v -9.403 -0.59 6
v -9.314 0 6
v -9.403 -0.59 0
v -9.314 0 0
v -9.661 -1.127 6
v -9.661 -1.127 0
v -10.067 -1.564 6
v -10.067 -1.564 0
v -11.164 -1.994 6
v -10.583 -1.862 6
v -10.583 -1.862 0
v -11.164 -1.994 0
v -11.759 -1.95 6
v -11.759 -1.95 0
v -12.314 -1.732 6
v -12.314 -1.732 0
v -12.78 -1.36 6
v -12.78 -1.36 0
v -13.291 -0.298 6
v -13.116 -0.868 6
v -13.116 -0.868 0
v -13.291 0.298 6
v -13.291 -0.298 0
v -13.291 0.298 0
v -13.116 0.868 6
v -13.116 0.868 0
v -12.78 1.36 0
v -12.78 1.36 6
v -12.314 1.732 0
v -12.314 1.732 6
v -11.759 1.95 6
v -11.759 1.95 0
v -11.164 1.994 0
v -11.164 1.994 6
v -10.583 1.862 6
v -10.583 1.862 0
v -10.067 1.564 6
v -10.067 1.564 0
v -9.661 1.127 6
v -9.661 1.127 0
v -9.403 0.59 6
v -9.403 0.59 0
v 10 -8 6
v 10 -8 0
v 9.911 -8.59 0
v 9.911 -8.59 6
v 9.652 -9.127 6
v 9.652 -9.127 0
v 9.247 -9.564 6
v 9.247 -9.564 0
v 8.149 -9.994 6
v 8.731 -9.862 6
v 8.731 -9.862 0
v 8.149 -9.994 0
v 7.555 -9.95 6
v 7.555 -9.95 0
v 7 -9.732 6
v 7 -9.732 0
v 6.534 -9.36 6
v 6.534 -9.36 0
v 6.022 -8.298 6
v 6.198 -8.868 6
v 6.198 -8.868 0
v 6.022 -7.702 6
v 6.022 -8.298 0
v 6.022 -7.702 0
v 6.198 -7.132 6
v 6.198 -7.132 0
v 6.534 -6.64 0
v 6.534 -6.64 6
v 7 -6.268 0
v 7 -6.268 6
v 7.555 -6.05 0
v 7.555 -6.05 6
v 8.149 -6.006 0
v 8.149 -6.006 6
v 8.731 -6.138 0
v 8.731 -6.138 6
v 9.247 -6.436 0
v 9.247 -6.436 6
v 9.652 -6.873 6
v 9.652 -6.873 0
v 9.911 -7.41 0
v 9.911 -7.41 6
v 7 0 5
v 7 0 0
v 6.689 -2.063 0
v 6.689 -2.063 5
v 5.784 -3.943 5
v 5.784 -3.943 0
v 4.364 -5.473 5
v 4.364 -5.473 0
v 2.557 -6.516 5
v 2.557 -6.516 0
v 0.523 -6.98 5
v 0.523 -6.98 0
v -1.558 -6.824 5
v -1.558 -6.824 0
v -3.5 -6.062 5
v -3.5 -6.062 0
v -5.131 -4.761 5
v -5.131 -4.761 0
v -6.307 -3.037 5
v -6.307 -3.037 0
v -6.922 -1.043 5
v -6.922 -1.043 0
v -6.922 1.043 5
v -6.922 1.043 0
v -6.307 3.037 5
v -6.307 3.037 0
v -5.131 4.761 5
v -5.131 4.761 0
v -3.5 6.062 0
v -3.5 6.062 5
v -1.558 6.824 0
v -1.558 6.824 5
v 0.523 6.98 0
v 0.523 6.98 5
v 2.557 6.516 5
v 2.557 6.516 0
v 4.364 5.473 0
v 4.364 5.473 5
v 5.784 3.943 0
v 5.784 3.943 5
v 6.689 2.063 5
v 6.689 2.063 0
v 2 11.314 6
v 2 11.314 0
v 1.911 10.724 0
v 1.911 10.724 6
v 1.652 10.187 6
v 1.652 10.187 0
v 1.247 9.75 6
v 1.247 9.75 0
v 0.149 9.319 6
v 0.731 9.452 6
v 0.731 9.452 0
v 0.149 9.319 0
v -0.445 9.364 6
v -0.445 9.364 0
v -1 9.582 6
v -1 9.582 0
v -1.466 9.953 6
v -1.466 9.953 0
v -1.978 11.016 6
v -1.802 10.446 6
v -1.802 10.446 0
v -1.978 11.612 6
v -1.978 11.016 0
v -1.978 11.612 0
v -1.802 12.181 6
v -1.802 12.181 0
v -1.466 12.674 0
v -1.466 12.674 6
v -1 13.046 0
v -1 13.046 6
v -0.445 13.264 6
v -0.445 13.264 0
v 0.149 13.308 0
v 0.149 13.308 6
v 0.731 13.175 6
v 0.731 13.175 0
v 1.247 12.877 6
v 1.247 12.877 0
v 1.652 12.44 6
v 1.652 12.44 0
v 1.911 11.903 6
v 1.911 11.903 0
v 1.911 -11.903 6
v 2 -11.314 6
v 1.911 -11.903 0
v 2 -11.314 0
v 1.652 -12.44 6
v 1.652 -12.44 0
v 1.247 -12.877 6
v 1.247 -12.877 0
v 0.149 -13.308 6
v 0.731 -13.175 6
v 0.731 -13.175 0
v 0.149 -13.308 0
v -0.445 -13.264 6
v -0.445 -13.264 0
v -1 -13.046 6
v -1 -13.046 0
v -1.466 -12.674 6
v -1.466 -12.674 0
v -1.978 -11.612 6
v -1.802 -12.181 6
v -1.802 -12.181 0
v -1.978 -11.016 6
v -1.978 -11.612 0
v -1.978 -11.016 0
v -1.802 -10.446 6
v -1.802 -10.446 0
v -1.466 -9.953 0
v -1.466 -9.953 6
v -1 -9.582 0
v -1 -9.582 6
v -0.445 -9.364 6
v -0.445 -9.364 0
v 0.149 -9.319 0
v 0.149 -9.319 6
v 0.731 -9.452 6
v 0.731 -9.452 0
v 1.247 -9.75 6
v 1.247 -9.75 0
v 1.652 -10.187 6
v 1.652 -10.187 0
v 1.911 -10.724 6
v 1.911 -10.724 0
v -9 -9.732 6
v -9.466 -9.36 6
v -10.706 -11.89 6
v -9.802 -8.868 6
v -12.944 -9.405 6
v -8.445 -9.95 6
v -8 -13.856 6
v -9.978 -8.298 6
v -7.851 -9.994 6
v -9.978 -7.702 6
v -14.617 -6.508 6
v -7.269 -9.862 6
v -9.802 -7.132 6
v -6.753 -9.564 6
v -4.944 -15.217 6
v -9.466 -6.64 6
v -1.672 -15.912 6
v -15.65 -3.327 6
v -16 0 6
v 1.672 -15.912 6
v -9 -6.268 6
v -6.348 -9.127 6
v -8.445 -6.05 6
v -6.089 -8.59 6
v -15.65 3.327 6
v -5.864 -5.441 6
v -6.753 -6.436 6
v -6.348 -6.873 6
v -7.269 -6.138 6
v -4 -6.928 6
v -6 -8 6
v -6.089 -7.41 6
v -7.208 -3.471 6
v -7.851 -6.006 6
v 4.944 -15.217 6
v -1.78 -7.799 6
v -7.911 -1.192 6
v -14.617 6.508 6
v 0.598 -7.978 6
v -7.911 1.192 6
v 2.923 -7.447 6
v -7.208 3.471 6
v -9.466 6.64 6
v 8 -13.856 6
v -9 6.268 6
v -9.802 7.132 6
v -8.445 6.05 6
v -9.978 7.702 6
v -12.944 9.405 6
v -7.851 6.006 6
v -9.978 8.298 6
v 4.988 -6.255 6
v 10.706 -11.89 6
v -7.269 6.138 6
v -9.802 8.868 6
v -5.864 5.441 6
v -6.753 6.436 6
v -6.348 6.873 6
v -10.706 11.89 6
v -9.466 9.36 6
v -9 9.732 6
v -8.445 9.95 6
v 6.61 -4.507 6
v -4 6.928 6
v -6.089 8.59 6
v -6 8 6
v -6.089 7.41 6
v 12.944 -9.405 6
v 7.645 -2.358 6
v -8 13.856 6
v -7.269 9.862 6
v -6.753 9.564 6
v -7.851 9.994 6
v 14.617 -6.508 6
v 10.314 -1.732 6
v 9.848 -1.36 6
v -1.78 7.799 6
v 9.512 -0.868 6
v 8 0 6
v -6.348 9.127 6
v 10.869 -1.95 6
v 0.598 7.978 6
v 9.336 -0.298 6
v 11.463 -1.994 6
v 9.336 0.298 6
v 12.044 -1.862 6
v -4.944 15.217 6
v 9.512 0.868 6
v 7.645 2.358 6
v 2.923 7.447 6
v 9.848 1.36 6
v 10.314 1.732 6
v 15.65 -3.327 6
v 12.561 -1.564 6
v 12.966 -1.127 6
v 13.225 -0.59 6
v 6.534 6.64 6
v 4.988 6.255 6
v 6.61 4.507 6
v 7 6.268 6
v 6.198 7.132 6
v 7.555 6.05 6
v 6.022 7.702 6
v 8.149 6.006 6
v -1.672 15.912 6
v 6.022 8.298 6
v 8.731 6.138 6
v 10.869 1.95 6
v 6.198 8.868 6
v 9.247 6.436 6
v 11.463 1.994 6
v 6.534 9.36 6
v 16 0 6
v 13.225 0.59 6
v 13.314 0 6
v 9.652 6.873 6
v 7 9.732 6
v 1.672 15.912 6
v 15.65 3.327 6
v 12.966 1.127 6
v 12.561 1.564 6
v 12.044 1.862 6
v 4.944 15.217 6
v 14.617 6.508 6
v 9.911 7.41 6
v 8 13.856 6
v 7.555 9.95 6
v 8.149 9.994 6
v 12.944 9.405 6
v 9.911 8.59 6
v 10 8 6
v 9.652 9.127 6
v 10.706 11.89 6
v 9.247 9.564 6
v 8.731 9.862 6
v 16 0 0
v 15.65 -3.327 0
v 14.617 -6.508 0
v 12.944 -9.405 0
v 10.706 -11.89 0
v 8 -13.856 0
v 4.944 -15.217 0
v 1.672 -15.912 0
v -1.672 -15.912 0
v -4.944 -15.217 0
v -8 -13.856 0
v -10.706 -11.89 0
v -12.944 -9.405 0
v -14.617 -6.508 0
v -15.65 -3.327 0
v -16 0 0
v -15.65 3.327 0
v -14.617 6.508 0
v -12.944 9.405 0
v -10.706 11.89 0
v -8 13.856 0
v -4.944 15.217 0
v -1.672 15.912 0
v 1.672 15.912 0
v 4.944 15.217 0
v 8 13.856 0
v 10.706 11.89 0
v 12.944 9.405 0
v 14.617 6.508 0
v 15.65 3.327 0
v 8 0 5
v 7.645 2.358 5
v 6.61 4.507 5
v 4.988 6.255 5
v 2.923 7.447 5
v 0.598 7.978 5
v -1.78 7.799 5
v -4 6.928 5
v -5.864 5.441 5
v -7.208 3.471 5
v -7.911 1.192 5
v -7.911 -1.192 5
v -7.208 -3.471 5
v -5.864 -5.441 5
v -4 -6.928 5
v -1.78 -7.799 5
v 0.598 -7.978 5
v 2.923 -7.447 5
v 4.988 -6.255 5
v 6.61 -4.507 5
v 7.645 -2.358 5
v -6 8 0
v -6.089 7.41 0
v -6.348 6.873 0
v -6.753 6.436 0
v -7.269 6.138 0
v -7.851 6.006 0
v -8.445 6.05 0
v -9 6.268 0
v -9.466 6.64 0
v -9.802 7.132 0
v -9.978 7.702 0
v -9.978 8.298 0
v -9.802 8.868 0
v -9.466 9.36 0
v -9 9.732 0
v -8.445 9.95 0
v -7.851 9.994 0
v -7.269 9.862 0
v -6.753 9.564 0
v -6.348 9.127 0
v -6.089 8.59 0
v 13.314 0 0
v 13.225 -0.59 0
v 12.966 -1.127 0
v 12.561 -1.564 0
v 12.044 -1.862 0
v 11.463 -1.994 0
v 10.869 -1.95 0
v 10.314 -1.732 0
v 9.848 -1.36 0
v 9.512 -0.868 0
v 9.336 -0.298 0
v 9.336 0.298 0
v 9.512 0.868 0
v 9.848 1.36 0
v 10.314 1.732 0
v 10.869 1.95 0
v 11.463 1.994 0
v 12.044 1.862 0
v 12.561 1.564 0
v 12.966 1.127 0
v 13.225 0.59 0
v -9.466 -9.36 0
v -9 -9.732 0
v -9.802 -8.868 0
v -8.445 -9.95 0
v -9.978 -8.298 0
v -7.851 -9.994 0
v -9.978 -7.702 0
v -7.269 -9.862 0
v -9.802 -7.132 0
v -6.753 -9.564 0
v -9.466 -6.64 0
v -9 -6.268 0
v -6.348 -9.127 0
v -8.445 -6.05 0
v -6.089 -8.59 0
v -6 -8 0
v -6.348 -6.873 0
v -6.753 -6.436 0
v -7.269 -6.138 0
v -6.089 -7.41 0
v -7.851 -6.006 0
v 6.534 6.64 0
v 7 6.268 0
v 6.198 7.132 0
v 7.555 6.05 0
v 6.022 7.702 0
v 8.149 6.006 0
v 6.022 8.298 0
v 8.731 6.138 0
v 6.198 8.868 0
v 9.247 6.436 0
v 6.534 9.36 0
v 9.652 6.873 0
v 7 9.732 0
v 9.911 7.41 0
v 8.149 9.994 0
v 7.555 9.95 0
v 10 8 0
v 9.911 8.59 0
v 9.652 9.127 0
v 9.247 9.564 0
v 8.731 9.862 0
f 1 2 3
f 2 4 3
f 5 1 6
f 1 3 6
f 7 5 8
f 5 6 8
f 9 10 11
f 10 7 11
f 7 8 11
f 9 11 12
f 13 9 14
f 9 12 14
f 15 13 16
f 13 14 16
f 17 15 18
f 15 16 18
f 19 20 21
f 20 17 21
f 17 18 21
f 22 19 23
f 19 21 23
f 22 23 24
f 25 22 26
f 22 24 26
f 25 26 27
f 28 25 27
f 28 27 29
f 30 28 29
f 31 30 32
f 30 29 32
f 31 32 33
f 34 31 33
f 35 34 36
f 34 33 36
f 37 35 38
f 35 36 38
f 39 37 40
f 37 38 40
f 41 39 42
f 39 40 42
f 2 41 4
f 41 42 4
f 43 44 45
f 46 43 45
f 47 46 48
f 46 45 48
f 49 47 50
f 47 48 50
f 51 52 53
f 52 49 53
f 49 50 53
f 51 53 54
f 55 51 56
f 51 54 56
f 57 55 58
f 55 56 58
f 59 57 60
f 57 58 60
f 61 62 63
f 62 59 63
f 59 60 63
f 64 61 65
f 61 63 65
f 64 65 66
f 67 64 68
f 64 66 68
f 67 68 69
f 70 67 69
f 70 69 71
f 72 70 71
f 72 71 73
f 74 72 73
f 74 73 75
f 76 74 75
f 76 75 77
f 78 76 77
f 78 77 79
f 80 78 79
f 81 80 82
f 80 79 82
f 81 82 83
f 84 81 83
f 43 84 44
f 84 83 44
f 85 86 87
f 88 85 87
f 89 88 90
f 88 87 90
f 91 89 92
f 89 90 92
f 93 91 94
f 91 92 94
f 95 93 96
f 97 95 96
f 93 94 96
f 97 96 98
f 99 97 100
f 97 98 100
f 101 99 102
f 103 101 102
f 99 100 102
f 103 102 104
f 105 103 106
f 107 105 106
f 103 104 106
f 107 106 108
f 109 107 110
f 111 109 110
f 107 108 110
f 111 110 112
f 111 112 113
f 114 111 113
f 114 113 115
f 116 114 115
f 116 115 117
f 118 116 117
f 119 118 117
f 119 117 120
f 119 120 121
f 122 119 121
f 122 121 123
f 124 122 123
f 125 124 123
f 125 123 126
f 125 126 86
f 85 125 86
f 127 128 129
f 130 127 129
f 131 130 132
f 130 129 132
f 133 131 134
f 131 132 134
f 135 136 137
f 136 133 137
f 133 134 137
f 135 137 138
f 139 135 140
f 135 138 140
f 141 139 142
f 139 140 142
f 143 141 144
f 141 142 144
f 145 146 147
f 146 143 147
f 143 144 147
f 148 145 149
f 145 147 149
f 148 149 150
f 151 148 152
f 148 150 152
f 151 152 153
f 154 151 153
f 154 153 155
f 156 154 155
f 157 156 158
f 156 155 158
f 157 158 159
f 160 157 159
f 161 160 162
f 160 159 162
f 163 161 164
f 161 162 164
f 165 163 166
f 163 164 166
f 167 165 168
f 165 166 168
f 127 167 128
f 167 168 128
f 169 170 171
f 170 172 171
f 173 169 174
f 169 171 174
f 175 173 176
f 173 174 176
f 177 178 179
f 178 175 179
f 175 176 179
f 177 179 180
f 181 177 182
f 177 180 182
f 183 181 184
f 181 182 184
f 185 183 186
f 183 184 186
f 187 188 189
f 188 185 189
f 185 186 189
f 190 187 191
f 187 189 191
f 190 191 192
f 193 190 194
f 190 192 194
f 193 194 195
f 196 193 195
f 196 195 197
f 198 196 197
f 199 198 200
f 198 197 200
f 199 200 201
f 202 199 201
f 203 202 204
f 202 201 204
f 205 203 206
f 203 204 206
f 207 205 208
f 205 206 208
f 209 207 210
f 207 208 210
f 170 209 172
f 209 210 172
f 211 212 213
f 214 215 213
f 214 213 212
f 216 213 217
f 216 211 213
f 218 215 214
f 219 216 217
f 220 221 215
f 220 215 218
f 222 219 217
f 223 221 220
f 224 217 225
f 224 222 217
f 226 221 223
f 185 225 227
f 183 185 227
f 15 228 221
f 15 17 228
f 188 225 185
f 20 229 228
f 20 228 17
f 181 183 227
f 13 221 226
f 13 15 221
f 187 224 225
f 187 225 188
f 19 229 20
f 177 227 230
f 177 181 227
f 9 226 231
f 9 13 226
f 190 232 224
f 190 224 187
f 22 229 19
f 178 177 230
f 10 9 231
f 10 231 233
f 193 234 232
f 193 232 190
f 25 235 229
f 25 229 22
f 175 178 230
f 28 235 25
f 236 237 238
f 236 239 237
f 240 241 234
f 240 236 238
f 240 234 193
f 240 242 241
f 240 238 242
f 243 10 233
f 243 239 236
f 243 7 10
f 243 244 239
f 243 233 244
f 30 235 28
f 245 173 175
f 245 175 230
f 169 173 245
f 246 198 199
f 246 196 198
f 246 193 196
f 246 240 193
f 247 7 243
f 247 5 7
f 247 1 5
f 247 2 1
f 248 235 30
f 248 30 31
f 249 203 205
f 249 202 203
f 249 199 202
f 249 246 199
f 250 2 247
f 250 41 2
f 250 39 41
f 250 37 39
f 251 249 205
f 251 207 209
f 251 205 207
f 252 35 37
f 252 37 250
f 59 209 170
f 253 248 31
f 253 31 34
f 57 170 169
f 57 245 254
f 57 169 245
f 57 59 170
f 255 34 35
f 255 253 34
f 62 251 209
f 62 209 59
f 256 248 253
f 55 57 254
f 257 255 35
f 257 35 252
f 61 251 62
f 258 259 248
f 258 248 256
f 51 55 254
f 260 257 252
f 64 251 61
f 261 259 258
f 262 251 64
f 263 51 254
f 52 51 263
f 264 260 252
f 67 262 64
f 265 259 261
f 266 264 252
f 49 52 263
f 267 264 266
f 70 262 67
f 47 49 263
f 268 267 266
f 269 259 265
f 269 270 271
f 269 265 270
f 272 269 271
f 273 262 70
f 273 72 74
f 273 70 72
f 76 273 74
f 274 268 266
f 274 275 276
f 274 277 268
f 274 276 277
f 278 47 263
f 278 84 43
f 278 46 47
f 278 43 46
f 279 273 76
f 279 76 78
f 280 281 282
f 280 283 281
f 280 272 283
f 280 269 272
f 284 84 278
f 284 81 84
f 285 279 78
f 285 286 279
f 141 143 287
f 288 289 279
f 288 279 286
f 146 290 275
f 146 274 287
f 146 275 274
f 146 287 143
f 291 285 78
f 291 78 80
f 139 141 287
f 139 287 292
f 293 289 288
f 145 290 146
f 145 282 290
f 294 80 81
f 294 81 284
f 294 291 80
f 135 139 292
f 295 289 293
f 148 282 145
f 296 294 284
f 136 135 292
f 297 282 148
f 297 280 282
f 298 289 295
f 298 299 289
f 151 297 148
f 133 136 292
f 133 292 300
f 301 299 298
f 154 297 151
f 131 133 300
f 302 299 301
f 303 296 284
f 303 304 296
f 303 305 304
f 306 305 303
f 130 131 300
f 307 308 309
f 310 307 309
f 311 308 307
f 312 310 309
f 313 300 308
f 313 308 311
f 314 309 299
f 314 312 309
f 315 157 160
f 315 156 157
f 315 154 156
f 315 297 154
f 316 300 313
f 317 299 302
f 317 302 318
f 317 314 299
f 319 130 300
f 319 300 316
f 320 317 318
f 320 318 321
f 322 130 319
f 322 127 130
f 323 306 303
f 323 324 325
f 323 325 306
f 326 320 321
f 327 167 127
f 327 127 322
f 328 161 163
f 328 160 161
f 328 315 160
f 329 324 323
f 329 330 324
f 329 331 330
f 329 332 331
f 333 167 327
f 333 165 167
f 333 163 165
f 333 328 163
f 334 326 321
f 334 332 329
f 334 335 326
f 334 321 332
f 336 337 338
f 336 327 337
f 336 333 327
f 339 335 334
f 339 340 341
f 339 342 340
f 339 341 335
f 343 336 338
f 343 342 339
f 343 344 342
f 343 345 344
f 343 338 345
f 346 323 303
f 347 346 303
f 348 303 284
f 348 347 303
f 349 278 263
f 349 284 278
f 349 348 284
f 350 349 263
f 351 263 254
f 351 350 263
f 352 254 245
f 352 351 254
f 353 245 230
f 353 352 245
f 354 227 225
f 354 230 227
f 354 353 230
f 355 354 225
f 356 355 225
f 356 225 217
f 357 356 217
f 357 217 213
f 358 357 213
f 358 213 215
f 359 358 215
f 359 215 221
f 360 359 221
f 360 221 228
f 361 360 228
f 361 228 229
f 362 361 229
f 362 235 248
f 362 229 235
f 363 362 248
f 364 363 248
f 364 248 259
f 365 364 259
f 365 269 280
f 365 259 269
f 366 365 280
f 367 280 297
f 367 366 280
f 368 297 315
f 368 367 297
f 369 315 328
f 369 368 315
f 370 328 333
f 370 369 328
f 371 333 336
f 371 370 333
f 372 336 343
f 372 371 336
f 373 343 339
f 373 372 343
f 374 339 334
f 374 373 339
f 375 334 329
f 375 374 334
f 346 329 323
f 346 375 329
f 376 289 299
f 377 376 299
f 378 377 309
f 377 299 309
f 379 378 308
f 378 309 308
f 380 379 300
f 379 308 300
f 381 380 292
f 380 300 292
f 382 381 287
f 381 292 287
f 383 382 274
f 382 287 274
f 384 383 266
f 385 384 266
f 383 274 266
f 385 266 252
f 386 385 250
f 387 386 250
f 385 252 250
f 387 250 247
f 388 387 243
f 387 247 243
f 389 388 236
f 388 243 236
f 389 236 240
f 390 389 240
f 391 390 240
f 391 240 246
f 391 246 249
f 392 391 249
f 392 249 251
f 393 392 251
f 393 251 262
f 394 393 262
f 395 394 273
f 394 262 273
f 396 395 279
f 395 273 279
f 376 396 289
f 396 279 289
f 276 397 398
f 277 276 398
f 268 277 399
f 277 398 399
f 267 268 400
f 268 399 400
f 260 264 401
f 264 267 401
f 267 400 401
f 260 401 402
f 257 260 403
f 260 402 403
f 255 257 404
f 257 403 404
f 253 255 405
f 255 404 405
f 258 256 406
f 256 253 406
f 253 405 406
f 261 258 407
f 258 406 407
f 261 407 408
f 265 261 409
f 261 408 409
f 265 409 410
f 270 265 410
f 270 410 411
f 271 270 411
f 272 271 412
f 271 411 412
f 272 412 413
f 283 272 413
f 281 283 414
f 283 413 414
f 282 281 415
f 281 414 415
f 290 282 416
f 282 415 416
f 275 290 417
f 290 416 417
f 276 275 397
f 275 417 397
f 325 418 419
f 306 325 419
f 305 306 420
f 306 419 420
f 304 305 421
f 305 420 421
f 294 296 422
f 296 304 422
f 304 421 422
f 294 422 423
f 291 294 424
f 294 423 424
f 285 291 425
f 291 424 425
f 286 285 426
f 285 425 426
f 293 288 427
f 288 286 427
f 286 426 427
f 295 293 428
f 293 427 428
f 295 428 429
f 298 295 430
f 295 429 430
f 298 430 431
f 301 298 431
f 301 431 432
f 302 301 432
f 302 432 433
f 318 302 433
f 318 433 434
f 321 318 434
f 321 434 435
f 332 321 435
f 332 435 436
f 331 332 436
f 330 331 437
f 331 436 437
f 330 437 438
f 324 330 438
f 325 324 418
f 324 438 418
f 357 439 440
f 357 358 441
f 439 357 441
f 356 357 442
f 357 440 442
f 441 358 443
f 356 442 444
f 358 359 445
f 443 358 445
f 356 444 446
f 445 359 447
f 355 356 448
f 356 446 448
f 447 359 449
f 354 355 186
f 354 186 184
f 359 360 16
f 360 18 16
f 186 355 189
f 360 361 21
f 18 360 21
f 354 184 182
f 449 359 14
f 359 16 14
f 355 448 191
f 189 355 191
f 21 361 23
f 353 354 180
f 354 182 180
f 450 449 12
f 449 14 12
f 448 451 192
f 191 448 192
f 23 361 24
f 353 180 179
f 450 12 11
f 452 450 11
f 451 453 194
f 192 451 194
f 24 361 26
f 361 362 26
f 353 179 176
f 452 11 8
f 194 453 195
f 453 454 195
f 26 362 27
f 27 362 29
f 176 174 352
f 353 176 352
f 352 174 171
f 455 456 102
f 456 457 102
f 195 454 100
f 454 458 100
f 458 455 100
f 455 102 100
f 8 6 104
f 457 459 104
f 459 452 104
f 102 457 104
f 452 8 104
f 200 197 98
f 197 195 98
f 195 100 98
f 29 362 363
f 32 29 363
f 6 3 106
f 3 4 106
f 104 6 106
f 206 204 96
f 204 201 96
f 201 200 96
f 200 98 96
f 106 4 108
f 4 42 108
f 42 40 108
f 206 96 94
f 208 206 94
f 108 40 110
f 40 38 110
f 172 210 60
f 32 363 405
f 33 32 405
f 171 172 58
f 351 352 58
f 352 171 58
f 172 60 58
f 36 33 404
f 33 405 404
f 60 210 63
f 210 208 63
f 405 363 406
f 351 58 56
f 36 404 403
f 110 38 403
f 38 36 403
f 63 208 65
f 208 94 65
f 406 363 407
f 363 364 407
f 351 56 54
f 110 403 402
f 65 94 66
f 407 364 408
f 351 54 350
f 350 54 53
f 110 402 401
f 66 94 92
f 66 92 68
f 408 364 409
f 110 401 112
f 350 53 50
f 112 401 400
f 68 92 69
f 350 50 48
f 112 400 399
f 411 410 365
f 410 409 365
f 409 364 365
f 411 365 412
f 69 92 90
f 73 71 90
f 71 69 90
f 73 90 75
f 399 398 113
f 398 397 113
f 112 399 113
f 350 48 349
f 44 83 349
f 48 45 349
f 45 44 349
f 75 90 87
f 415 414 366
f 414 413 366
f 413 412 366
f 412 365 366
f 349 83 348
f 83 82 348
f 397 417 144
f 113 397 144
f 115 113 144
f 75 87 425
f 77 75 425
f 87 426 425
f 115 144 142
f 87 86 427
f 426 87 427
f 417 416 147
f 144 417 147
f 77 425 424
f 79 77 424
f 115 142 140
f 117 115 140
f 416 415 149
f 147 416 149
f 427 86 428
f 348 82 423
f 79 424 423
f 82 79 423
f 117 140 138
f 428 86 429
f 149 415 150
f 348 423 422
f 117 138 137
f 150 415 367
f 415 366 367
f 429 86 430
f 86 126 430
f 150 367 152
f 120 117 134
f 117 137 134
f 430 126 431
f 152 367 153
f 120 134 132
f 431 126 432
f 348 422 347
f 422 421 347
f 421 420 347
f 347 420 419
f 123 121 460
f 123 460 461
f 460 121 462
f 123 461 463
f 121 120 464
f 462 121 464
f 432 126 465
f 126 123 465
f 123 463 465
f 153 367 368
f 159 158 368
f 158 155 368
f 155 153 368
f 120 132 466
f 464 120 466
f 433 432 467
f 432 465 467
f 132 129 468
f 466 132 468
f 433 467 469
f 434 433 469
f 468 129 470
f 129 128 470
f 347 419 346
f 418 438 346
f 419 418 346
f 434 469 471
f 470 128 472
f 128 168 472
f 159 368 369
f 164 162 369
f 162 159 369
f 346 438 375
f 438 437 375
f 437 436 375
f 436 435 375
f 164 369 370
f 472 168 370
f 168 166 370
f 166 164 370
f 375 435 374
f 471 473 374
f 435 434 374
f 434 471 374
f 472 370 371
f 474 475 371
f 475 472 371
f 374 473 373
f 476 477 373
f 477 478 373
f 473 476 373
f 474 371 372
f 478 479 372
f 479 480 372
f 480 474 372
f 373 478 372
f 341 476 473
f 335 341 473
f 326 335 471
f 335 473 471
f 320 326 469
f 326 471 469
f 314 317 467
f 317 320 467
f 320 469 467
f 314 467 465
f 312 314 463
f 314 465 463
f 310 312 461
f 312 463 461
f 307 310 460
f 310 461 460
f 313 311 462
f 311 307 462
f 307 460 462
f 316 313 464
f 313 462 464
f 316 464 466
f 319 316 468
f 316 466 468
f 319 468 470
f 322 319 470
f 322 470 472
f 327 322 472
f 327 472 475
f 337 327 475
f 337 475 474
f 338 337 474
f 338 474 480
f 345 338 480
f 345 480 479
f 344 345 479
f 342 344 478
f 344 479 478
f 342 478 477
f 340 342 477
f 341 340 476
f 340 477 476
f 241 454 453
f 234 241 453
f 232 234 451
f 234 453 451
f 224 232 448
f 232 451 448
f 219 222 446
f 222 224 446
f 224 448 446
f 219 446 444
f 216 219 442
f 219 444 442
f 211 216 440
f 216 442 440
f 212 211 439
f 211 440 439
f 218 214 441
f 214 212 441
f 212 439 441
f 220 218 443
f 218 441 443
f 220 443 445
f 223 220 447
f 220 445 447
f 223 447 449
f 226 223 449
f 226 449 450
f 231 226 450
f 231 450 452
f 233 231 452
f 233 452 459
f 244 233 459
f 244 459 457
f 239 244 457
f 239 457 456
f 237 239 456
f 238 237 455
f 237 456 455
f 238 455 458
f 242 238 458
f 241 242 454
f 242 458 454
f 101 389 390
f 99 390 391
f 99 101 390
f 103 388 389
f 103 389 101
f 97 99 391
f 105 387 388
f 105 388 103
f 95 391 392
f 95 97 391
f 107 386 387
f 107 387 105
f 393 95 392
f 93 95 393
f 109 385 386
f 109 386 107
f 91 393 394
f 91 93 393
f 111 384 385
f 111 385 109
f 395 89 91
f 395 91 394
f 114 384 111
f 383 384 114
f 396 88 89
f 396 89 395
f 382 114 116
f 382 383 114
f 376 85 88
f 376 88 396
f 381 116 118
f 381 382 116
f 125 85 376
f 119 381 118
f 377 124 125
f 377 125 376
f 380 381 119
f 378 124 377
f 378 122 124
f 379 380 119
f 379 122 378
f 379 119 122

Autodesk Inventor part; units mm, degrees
ref_plane "YZ Plane" through (0, 0, 0) normal (1, 0, 0) x (0, 1, 0)
ref_plane "XZ Plane" through (0, 0, 0) normal (0, 1, 0) x (-1, 0, 0)
ref_plane "XY Plane" through (0, 0, 0) normal (0, 0, 1) x (1, 0, 0)
sketch "Base" plane through (0, 0, 0) normal (0, 0, 1) x (1, 0, 0)
  circle A0 centre (0, 0) radius 16
  circle A1 centre (0, 0) radius 7
  circle A2 centre (0, 0) radius 11.3137 construction
  line L0 (-8, 8) -> (8, 8) construction
  line L1 (8, 8) -> (8, -8) construction
  line L2 (8, -8) -> (-8, -8) construction
  line L3 (-8, -8) -> (-8, 8) construction
  circle A3 centre (-8, 8) radius 2
  circle A4 centre (8, 8) radius 2
  circle A5 centre (-8, -8) radius 2
  circle A6 centre (8, -8) radius 2
  circle A7 centre (-11.3137, 0) radius 2
  circle A8 centre (0, 11.3137) radius 2
  line L4 (0, 8) -> (0, -8) construction
  circle A9 centre (11.3137, 0) radius 2
  line L5 (-8, 0) -> (8, 0) construction
  line L6 (0, 11.3137) -> (0, 0) construction
  line L7 (0, 11.3137) -> (0, -8) construction
  line L8 (-11.3137, 0) -> (0, 0) construction
  circle A10 centre (0, -11.3137) radius 2
  line L9 (0, -11.3137) -> (0, 0) construction
  dimension "d0" = 32
  dimension "d1" = 14
  dimension "d2" = 4
  dimension "d3" = 4
  dimension "d4" = 4
  dimension "d5" = 4
  dimension "d6" = 16
extrude "BaseFeature" add sketch "Base" along normal blind 6
sketch "Indent" plane through (0, 0, 6) normal (0, 0, 1) x (1, 0, 0)
  circle A0 centre (0, 0) radius 8
  dimension "d9" = 16
extrude "IndentFeature" cut sketch "Indent" against normal blind 1
sketch "ShoulderJointPoint" plane through (0, 0, 6) normal (0, 0, 1) x (1, 0, 0)
  point P0 (0, 0)
properties part number "PatternSpacer4mm" material "Aluminum 6061"
